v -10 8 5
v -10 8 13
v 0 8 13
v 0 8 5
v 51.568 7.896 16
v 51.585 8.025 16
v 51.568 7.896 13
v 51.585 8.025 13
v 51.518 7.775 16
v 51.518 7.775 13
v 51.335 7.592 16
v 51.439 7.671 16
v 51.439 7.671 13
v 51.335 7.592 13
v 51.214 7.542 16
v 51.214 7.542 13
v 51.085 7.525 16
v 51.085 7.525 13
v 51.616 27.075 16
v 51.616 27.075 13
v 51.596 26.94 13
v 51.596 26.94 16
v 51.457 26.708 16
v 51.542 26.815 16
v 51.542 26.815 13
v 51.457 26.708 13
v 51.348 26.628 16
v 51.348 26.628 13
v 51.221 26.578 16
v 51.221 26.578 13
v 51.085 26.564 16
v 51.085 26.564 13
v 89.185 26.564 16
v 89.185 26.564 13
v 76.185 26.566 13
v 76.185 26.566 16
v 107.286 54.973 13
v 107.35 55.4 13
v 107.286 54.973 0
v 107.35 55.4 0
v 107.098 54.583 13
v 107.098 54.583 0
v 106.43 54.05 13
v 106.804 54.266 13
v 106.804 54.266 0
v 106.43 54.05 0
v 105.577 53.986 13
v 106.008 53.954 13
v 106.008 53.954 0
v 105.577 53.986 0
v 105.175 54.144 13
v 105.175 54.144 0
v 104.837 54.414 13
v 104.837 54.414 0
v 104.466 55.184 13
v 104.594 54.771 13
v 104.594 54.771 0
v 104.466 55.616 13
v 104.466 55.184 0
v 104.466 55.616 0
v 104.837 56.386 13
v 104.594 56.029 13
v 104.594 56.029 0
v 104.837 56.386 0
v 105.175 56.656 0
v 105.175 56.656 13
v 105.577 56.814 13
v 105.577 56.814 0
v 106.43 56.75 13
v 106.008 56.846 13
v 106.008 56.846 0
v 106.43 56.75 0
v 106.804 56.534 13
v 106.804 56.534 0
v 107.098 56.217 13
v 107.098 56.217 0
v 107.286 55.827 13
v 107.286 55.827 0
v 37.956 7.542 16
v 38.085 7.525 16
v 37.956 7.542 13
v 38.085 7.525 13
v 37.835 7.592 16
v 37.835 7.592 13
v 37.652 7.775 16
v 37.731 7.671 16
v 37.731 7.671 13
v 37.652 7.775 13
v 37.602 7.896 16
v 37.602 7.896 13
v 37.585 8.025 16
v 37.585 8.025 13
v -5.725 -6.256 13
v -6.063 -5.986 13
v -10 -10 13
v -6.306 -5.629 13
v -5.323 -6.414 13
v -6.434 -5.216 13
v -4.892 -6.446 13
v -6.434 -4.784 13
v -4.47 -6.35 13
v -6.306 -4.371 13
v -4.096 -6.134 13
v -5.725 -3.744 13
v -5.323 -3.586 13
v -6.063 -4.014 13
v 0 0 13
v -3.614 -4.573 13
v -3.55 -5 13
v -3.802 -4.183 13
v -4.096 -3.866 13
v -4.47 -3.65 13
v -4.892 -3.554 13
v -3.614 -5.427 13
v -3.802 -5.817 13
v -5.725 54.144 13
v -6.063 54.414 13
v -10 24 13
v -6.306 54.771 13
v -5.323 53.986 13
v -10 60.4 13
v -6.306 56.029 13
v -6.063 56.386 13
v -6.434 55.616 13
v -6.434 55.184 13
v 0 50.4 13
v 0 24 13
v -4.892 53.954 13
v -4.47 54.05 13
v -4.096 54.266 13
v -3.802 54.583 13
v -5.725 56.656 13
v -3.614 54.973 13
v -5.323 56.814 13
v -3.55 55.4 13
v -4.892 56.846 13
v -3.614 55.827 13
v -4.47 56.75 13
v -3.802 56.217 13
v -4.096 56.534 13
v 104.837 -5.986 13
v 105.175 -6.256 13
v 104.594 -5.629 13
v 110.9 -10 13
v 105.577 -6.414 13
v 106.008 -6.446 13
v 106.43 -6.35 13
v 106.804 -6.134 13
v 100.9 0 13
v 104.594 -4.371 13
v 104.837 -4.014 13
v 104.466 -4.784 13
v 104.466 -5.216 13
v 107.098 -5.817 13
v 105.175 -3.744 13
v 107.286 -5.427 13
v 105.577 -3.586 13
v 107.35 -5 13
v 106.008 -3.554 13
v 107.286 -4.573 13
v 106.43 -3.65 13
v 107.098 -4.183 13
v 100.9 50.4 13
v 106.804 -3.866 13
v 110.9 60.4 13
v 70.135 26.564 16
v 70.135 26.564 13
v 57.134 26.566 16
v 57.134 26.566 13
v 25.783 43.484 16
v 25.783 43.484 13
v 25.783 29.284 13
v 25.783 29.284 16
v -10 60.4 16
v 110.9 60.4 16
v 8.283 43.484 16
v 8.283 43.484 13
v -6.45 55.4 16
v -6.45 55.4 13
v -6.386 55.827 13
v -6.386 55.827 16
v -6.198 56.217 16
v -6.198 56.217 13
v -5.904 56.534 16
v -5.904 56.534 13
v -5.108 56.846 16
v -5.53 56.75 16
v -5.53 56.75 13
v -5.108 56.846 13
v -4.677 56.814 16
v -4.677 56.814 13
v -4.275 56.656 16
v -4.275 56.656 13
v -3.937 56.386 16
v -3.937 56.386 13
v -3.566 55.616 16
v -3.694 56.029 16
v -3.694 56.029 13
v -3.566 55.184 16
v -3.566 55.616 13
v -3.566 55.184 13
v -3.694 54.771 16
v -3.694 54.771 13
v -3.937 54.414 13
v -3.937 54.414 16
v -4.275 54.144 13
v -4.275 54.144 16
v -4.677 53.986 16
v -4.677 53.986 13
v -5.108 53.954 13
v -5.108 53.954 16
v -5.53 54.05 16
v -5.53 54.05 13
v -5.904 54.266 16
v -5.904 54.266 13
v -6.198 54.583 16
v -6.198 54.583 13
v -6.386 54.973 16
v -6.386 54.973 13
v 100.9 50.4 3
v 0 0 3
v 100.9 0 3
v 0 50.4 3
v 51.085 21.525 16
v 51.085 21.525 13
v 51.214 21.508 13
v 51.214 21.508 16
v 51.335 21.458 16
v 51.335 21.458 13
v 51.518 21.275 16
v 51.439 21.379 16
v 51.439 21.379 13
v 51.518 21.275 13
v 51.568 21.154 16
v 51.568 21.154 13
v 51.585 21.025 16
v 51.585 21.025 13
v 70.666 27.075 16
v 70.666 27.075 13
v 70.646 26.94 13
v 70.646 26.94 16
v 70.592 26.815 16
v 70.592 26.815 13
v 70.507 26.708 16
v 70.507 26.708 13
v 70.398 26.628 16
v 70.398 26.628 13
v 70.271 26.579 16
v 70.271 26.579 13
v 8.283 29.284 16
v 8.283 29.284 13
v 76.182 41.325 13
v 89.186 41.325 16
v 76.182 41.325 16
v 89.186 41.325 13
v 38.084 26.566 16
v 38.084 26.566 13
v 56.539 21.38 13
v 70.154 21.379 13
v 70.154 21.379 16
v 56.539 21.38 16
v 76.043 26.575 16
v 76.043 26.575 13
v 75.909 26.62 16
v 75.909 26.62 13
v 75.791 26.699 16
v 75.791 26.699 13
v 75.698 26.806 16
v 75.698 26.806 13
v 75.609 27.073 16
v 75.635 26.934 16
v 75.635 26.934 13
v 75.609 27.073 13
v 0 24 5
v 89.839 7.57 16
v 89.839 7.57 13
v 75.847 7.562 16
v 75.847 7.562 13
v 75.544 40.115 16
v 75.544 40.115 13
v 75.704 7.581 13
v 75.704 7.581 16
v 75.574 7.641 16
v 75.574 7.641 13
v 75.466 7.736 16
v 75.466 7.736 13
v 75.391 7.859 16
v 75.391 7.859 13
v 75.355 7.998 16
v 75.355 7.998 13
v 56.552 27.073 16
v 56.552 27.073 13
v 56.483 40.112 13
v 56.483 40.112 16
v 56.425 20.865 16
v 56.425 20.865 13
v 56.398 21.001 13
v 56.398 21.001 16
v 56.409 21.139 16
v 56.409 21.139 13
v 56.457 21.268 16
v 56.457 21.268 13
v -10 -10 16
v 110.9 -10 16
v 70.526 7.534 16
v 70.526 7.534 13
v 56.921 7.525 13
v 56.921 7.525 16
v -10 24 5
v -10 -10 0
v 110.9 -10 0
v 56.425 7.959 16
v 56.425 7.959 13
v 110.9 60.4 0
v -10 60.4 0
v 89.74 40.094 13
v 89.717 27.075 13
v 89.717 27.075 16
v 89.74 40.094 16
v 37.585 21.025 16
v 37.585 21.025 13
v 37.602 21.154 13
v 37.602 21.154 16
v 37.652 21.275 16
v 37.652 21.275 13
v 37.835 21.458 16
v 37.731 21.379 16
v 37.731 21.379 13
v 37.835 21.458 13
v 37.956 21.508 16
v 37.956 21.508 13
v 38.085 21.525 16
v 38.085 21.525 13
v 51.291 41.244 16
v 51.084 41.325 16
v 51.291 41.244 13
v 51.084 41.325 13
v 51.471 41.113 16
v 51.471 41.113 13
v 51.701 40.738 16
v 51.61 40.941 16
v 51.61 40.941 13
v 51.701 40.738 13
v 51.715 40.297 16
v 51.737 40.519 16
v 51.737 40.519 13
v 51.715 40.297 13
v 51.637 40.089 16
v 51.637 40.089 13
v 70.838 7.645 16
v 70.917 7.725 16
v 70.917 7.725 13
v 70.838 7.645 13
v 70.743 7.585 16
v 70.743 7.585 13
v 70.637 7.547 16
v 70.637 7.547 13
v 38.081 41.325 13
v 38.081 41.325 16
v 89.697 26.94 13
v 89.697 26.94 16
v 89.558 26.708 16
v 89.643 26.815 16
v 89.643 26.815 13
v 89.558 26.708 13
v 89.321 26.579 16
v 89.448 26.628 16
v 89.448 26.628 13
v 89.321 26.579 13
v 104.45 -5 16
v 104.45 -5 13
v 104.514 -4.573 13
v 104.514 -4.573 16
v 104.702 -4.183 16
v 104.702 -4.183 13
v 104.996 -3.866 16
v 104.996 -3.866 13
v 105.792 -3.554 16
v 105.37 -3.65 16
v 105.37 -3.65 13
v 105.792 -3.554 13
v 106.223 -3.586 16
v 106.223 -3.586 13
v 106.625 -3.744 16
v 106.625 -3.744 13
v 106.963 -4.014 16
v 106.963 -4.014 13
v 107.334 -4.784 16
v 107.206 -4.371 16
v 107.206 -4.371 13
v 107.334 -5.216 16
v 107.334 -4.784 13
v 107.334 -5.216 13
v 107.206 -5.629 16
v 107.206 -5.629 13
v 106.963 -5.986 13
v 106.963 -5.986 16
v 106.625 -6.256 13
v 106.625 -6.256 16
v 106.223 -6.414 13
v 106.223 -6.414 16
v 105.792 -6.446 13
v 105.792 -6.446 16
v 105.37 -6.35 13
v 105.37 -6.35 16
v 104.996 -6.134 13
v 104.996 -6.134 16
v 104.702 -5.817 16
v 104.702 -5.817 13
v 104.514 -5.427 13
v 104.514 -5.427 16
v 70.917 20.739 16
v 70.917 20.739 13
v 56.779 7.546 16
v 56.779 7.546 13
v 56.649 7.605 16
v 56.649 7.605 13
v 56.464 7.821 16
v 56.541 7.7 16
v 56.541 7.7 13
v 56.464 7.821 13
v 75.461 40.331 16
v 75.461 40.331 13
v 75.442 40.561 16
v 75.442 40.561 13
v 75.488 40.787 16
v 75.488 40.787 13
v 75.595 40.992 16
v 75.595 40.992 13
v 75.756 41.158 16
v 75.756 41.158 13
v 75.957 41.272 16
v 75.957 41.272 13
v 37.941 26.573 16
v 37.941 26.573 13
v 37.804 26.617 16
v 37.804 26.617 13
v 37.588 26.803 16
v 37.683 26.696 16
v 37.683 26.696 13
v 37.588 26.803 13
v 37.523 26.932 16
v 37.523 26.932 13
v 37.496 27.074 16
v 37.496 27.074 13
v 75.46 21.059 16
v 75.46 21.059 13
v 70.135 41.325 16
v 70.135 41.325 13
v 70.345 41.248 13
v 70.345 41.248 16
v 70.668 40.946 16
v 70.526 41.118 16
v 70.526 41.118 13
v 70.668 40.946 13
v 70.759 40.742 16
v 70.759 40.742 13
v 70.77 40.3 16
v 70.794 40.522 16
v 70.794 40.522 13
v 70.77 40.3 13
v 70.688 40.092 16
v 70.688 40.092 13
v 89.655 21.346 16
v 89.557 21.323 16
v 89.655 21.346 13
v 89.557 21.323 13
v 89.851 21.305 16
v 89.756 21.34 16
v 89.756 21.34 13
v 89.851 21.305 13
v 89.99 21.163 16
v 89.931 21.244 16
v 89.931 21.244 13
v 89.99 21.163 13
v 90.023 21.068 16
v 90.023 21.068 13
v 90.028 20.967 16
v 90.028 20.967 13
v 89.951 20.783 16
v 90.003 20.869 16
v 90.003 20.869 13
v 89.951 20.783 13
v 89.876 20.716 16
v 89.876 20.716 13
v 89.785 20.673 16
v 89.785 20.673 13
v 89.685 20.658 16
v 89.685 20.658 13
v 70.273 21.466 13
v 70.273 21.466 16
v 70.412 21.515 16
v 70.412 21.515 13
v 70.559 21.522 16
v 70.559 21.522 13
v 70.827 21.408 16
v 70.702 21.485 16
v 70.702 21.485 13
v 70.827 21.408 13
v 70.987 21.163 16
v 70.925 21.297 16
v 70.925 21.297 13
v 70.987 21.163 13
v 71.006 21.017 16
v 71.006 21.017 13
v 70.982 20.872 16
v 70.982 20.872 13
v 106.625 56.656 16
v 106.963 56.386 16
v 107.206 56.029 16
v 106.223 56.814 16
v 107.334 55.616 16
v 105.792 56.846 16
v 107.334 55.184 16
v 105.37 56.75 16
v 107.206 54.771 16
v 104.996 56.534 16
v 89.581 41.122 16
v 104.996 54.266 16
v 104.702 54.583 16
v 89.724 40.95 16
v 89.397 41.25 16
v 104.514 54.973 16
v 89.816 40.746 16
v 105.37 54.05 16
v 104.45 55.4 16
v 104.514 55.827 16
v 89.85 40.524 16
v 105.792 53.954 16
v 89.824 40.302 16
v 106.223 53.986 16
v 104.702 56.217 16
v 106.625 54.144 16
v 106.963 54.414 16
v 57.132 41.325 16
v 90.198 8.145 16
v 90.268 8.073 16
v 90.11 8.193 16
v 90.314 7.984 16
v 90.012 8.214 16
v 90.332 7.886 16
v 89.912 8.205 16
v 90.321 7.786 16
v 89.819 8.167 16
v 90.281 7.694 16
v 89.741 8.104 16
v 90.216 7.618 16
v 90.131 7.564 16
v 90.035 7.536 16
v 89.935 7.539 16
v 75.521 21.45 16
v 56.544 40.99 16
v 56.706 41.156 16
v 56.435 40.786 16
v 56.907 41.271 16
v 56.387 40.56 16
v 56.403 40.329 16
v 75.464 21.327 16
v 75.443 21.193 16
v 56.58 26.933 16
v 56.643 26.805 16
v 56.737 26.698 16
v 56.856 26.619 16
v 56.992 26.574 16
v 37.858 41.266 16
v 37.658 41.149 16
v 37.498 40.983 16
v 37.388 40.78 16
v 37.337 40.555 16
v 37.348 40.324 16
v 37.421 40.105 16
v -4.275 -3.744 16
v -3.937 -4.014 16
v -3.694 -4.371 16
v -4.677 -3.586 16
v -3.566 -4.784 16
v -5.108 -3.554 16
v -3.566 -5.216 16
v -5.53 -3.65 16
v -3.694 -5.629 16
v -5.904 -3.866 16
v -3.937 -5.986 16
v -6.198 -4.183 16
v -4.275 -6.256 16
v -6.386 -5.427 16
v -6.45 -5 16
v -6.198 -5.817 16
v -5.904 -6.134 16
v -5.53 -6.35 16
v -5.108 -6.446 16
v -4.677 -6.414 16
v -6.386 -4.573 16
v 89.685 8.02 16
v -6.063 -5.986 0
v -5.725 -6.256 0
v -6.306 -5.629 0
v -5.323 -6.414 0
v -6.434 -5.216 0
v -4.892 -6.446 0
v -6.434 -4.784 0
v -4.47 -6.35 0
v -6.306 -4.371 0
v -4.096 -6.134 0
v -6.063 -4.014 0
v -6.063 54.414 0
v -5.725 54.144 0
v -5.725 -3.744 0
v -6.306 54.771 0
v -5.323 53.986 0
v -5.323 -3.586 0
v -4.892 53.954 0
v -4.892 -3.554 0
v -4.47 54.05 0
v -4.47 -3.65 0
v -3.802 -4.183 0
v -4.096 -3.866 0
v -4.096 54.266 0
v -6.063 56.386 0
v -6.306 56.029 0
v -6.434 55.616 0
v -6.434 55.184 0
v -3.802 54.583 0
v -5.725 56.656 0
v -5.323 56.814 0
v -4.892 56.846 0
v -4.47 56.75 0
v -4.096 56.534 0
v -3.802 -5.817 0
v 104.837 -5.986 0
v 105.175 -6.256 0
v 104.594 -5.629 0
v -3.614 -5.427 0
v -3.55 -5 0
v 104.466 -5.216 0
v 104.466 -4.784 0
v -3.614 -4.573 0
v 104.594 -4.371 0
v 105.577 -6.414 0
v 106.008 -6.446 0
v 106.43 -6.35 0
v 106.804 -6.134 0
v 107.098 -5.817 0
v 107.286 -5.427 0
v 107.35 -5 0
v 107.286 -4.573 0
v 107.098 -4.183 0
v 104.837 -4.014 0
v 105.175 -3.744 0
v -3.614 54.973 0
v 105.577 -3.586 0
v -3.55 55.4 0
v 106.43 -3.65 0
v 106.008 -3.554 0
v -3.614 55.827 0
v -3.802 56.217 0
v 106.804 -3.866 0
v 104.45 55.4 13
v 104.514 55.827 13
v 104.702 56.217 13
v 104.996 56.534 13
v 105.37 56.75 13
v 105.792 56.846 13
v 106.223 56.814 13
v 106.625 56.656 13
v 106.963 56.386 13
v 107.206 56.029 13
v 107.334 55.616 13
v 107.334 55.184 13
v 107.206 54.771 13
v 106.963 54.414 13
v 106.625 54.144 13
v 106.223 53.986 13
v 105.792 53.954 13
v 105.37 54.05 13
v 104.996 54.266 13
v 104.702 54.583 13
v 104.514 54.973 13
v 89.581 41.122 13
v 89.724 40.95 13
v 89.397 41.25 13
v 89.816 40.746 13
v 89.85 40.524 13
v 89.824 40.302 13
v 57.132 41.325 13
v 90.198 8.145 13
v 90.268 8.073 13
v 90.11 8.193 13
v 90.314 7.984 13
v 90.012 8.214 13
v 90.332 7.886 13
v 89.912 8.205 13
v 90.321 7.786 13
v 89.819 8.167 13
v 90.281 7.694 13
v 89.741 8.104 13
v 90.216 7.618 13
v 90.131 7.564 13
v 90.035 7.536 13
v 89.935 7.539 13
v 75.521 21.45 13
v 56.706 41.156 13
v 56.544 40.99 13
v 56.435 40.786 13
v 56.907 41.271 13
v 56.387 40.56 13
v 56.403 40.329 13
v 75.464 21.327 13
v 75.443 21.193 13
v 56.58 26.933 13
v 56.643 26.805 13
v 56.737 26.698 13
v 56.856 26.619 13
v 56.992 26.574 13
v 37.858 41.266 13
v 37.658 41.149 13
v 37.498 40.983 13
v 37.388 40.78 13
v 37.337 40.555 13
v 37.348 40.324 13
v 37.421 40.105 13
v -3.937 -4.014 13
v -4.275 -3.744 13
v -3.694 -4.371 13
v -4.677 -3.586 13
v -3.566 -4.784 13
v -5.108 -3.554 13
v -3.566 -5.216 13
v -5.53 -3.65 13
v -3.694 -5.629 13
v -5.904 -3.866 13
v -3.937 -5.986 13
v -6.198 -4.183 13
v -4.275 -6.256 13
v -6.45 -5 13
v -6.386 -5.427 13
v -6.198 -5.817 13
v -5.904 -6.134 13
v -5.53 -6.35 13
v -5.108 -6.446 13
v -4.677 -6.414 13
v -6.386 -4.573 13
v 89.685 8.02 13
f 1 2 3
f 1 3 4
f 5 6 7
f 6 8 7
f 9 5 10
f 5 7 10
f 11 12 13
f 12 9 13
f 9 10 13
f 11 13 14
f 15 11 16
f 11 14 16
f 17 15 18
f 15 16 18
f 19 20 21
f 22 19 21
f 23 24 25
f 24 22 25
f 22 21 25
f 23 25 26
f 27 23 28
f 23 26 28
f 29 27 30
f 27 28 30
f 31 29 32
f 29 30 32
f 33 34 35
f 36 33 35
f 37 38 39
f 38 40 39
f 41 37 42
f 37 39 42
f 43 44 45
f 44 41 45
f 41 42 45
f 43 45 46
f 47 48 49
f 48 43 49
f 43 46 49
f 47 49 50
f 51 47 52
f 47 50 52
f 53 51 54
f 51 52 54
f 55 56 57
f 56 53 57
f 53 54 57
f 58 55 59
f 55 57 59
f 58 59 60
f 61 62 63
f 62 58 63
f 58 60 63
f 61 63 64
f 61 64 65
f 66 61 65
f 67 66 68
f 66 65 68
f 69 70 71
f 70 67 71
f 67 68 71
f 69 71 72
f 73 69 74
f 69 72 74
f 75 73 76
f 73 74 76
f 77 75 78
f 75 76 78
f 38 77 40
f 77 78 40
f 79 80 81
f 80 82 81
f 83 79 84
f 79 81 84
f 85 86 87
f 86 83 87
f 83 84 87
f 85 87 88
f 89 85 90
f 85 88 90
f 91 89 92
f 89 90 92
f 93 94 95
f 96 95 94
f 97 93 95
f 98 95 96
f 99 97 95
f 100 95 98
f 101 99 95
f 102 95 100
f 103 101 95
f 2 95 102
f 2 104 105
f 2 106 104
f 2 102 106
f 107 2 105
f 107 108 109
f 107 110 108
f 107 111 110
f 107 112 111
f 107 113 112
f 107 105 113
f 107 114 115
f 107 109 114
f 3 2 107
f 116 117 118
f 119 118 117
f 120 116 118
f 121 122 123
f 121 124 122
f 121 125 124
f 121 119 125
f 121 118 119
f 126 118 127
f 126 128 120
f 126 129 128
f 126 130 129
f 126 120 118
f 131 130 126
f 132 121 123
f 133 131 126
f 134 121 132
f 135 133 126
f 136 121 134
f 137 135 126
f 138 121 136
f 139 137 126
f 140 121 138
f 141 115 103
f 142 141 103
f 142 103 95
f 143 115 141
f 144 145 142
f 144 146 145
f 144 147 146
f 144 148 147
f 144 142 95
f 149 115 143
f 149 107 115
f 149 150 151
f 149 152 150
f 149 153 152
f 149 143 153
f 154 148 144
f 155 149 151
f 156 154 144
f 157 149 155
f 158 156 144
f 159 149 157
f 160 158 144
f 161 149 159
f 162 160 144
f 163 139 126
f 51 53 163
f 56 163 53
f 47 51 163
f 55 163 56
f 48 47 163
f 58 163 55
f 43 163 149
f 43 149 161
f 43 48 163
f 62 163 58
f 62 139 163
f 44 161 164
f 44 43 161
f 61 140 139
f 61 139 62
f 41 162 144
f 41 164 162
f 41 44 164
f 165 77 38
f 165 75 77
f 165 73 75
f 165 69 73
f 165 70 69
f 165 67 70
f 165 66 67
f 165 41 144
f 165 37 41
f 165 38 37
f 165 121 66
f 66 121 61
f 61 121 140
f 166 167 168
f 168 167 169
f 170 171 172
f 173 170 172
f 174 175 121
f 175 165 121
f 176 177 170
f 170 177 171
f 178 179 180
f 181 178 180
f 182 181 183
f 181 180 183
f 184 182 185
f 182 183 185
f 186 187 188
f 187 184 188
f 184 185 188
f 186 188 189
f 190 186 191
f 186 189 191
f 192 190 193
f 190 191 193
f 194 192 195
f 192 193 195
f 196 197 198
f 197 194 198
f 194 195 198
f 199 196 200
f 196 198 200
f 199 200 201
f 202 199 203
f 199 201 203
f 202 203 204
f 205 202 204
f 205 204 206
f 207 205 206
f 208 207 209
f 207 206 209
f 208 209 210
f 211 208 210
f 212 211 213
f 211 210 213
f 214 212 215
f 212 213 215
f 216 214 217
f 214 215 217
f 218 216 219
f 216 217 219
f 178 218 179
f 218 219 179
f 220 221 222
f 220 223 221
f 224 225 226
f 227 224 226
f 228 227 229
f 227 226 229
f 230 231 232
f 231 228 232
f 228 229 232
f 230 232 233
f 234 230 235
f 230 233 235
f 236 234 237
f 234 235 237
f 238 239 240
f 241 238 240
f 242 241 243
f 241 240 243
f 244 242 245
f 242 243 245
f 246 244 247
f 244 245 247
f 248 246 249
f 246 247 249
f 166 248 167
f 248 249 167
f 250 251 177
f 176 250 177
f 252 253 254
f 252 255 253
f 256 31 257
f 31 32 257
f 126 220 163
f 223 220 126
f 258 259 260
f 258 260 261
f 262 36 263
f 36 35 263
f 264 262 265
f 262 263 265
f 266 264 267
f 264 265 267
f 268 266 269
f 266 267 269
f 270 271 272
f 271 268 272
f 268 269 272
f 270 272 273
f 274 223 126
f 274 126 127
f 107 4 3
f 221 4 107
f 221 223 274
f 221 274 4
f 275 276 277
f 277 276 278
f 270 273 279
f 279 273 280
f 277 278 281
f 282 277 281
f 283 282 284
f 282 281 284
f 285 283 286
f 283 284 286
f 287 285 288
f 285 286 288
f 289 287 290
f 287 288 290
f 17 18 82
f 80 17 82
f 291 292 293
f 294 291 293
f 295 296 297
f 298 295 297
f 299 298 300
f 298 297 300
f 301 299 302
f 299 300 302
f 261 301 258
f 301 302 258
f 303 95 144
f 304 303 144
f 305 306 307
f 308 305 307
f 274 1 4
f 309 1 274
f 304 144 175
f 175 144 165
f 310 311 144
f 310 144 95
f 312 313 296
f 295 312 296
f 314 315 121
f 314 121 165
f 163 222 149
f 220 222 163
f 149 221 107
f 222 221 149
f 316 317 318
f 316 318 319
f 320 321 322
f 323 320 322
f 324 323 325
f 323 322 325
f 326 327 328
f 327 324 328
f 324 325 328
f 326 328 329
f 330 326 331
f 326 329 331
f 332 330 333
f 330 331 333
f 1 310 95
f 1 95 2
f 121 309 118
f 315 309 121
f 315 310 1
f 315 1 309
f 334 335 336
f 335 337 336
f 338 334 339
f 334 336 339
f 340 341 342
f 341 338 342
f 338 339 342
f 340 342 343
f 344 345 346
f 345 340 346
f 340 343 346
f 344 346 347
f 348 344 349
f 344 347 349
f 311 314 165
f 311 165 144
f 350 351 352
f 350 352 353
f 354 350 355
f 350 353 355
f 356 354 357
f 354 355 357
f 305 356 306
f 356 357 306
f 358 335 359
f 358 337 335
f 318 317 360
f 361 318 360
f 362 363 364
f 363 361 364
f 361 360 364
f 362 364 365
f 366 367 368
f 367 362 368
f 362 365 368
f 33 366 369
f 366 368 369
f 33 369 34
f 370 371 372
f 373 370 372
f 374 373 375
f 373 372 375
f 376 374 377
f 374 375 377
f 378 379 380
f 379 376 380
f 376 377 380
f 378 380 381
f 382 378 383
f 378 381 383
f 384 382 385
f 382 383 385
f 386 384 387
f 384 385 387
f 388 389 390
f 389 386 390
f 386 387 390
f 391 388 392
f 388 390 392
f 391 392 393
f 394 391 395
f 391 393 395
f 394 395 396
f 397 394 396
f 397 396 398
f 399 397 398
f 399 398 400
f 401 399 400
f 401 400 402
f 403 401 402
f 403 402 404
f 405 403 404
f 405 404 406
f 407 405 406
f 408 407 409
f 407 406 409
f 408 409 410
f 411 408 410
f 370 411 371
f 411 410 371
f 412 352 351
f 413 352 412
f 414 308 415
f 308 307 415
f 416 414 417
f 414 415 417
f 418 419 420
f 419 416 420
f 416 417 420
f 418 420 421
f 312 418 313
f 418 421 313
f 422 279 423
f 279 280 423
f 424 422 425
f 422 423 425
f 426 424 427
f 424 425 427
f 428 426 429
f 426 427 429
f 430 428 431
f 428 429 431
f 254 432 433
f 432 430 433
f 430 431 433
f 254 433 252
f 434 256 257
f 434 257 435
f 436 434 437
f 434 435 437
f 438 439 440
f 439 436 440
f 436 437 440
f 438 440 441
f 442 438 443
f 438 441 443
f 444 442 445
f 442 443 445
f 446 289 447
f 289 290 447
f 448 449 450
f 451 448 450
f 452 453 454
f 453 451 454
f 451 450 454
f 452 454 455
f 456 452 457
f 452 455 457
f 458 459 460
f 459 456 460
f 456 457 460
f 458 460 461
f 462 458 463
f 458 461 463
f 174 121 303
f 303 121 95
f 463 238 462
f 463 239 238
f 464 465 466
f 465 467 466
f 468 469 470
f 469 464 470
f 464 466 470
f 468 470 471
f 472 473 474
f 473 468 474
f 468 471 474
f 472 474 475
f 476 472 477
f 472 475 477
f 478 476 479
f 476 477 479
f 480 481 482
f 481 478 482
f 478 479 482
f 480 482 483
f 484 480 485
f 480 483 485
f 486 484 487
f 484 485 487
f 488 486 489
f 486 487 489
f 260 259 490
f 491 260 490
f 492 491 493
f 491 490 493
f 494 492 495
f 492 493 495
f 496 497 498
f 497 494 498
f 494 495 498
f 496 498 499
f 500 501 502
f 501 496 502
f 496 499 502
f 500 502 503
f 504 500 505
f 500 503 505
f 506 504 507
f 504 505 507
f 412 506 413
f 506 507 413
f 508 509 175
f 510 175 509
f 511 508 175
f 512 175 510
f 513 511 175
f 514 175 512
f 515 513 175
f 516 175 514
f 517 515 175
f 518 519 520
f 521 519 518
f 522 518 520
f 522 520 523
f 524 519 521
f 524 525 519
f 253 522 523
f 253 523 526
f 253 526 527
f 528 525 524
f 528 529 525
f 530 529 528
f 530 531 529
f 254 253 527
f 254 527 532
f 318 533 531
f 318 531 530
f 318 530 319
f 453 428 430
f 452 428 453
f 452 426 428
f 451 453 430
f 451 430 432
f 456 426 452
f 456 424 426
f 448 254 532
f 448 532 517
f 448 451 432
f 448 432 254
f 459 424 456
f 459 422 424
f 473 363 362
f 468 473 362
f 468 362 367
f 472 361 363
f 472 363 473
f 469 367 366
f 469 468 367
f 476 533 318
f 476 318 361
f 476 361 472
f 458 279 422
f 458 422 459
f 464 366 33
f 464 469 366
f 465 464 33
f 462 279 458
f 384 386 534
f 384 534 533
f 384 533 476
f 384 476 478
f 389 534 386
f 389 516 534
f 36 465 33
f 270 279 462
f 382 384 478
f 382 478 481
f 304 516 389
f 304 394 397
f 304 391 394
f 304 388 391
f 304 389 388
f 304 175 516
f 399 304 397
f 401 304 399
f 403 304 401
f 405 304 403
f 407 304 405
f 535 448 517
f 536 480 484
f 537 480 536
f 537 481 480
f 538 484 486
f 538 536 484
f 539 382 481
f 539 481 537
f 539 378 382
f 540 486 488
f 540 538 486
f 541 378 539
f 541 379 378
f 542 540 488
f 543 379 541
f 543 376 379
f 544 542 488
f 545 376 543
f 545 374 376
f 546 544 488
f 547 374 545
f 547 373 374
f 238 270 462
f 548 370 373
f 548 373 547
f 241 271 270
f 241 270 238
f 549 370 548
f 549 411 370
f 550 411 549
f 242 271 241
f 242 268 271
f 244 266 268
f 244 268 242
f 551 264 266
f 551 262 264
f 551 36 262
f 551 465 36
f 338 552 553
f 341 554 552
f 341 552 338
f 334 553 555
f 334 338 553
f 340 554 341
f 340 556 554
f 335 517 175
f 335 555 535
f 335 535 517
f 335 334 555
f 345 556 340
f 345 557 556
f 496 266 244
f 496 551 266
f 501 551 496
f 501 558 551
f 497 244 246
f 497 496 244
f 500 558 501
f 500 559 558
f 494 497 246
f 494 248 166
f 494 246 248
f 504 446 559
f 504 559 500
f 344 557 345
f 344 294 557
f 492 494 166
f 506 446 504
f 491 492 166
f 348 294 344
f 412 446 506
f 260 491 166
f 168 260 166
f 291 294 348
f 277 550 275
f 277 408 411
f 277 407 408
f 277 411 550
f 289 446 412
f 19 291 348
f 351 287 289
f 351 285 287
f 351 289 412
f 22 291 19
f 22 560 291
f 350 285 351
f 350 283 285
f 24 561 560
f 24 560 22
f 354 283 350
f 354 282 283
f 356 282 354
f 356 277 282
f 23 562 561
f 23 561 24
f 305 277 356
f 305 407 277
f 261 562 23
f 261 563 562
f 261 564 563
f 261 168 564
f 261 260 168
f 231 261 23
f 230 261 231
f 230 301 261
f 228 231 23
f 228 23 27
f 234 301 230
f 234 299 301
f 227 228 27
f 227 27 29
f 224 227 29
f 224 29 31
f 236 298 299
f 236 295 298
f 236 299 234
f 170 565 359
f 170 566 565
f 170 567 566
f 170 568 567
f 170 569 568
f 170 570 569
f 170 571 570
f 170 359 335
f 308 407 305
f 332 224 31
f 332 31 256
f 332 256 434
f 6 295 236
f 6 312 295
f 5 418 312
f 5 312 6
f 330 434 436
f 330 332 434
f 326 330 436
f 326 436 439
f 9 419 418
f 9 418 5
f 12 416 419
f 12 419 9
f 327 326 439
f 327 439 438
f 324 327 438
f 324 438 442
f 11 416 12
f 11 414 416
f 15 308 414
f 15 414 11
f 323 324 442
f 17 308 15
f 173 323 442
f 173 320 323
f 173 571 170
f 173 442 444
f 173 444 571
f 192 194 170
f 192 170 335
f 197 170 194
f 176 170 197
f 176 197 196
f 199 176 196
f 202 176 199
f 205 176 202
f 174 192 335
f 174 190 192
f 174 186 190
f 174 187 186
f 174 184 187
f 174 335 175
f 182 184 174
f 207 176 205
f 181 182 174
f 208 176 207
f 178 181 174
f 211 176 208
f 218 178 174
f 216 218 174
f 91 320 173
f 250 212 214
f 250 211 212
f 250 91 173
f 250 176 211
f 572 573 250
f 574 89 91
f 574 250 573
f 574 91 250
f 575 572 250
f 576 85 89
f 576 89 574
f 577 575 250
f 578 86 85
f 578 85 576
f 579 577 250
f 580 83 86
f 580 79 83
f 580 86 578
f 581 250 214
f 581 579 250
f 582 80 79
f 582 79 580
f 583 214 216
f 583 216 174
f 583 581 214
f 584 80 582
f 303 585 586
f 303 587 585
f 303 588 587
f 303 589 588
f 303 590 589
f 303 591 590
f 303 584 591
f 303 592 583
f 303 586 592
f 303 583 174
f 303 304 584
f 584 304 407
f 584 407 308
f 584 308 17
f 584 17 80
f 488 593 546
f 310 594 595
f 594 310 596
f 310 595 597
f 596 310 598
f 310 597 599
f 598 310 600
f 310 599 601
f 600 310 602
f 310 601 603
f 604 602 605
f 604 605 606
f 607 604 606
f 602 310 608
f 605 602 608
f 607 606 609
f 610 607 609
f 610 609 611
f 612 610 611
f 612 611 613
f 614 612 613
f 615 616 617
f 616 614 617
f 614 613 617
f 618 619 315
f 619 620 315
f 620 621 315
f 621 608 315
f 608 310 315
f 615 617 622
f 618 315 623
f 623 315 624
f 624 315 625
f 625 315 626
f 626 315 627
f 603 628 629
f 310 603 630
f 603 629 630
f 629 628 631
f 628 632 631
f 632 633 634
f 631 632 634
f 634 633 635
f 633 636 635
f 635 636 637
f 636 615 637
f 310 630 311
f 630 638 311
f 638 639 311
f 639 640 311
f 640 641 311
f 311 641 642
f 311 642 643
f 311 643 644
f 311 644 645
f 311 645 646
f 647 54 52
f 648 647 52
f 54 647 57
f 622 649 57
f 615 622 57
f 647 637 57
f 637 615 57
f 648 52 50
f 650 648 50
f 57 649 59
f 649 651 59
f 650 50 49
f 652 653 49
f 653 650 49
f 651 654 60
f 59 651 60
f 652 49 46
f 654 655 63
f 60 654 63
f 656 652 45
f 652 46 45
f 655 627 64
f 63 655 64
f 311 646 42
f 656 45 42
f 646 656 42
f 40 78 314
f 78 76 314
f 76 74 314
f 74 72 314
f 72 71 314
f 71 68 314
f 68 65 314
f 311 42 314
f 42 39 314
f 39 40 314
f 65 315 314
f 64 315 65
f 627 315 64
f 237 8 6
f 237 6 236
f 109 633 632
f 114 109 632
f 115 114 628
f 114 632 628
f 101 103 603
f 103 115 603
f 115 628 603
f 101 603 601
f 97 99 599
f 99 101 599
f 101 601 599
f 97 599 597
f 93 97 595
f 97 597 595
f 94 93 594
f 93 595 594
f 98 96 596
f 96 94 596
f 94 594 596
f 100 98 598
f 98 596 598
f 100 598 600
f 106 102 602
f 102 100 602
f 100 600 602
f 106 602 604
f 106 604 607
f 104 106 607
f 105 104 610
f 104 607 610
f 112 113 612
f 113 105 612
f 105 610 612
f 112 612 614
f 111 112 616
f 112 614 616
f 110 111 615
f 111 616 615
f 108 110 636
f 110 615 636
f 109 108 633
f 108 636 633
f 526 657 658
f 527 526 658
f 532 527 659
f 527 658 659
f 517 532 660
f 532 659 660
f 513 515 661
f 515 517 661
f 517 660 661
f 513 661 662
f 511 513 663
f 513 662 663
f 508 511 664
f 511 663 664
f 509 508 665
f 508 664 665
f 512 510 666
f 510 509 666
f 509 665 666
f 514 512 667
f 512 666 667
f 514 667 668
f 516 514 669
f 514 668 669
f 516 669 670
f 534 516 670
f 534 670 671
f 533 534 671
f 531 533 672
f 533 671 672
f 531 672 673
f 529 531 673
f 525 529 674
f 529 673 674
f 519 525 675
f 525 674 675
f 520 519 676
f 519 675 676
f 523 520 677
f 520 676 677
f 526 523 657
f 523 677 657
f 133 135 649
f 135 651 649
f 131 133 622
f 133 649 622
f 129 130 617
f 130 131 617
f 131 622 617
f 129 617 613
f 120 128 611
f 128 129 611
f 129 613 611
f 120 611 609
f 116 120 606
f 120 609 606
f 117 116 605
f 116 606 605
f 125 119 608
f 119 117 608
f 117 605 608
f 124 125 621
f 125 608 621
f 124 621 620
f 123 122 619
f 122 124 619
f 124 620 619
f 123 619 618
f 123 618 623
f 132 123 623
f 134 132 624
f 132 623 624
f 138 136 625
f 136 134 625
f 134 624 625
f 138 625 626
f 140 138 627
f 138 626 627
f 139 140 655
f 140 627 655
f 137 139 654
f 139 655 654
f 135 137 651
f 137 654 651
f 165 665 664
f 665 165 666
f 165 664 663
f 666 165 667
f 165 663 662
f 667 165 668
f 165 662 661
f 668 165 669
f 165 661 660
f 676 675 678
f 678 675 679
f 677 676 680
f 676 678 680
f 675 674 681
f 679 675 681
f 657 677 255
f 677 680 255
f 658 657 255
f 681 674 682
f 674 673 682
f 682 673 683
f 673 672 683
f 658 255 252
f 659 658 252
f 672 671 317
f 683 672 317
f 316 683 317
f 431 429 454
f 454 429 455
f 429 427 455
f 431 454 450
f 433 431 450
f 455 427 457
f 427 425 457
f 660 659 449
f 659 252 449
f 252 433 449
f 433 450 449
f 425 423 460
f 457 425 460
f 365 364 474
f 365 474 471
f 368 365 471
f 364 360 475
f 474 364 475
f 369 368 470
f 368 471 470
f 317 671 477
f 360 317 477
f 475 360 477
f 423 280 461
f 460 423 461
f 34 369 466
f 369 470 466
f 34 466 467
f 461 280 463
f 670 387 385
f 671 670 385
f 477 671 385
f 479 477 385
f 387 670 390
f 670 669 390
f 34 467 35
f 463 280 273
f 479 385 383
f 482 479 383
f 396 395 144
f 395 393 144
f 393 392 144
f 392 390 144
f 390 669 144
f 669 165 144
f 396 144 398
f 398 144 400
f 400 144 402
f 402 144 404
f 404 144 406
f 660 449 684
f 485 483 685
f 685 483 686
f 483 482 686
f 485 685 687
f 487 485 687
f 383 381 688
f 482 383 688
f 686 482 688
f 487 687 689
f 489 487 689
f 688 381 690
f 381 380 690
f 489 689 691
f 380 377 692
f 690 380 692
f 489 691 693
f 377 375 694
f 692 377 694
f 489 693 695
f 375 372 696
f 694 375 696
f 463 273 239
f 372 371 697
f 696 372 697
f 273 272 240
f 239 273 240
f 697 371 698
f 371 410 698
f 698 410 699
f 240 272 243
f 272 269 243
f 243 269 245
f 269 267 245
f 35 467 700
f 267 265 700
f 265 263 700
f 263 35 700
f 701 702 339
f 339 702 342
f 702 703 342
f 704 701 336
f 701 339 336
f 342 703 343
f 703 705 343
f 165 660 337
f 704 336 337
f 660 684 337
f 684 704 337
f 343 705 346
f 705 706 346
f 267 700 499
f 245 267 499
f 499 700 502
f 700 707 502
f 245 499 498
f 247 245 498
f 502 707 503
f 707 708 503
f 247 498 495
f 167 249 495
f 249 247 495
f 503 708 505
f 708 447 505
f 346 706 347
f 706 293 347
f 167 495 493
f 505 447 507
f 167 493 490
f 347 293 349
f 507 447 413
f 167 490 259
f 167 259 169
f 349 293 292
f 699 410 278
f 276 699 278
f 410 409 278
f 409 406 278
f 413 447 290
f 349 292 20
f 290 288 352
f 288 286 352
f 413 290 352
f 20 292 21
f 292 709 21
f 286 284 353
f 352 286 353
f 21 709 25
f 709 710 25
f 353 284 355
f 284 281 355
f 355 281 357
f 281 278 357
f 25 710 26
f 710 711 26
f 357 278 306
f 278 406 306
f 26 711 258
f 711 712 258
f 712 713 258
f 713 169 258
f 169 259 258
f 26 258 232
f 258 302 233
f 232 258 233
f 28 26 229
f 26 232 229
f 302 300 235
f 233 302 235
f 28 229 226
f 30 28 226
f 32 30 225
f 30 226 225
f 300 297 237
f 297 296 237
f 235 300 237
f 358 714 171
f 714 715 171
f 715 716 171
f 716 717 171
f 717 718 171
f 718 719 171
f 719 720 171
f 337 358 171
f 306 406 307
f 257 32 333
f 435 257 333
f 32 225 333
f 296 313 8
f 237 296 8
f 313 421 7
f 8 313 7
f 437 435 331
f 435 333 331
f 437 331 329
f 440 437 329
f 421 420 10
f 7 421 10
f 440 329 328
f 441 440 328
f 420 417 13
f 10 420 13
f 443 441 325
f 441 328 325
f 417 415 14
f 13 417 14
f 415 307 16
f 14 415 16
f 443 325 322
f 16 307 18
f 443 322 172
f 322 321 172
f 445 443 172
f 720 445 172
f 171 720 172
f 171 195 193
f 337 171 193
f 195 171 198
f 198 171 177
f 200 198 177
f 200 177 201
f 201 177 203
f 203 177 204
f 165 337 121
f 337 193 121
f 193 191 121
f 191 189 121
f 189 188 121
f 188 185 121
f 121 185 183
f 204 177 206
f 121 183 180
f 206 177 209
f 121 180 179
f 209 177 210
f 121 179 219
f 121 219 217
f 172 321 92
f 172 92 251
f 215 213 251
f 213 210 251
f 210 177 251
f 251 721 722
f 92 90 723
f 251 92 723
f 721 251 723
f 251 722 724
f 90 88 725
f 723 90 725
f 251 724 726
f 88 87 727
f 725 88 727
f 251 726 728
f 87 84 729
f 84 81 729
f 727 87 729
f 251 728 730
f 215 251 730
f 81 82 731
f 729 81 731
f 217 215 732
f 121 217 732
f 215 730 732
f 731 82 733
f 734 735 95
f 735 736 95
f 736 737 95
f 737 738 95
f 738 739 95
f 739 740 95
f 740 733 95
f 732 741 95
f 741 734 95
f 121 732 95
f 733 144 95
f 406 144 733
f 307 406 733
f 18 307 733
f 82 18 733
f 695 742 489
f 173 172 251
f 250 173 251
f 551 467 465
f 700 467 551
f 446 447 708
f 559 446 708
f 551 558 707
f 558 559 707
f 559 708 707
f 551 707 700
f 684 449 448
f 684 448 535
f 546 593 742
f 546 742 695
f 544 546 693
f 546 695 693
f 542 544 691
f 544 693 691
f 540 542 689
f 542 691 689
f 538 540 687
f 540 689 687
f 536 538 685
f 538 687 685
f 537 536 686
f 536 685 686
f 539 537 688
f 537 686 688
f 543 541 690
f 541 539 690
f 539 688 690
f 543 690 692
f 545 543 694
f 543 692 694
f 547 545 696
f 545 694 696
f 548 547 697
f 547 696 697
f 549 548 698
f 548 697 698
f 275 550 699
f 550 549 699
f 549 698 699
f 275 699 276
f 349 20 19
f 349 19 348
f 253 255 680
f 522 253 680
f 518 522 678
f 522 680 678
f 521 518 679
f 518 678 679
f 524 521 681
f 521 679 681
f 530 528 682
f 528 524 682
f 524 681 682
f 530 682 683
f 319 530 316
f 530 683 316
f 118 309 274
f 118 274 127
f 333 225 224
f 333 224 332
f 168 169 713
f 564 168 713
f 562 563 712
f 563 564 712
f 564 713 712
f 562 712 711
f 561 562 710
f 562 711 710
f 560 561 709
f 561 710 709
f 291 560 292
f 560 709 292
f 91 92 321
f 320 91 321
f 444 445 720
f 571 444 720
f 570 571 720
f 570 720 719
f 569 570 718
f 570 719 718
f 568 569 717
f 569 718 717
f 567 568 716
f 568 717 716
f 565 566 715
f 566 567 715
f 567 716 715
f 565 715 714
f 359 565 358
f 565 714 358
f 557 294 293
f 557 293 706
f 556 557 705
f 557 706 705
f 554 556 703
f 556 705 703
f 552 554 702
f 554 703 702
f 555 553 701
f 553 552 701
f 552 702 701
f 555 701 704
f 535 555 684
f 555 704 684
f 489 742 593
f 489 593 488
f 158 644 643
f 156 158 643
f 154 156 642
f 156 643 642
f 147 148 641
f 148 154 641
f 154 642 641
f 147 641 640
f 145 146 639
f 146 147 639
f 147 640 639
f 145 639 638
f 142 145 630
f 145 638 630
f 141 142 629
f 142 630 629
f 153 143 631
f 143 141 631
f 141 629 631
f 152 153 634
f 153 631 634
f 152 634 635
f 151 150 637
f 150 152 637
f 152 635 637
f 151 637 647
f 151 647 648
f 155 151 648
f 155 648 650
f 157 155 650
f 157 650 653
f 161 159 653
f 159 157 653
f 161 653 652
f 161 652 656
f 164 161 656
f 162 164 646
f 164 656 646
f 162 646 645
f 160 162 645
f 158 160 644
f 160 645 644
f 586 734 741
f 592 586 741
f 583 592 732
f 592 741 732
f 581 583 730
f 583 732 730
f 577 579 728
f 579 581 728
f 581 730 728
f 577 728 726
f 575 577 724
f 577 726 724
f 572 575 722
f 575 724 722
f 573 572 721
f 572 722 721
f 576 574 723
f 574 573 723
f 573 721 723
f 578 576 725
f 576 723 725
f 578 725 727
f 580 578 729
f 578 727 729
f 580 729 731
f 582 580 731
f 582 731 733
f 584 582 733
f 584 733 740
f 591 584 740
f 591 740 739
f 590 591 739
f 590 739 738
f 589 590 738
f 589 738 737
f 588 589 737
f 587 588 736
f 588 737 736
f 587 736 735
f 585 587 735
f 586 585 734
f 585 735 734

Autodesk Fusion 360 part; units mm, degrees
sketch "Sketch1" plane through (0, 0, 0) normal (0, 0, 1) x (1, 0, 0)
  line L0 (0, 0) -> (100.9, 0)
  line L1 (100.9, 0) -> (100.9, 50.4)
  line L2 (100.9, 50.4) -> (0, 50.4)
  line L3 (0, 50.4) -> (0, 0)
  line L4 (-10, 60.4) -> (110.9, 60.4)
  line L5 (110.9, 60.4) -> (110.9, -10)
  line L6 (110.9, -10) -> (-10, -10)
  line L7 (-10, -10) -> (-10, 60.4)
  circle A0 centre (-5, 55.4) radius 1.45
  circle A1 centre (-5, -5) radius 1.45
  circle A2 centre (105.9, 55.4) radius 1.45
  circle A3 centre (105.9, -5) radius 1.45
  dimension "d1" = 100.9
  dimension "d2" = 50.4
  dimension "d3" = 10
  dimension "d4" = 10
  dimension "d5" = 10
  dimension "d6" = 10
  dimension "d7" = 2.9
  dimension "d8" = 2.9
  dimension "d9" = 2.9
  dimension "d10" = 2.9
  dimension "d11" = 5
  dimension "d12" = 5
  dimension "d13" = 5
  dimension "d14" = 5
  dimension "d15" = 5
  dimension "d16" = 5
  dimension "d17" = 5
  dimension "d18" = 5
extrude "Extrude1" add sketch "Sketch1" along normal blind 13 makes body 1
extrude "Extrude2" add sketch "Sketch1" along normal blind 3 contours L0 L1 L2 L3 bodies 1
sketch "plate-2026-06-09T01_52_59.866Z" plane through (0, 0, 13) normal (0, 0, 1) x (1, 0, 0)
  line L0 (3.025, -32.525) -> (16.025, -32.525)
  line L1 (3.025, -46.525) -> (16.025, -46.525)
  line L2 (2.525, -33.025) -> (2.525, -46.025)
  line L3 (16.525, -33.025) -> (16.525, -46.025)
  arc A0 (3.025, -32.525) -> (2.525, -33.025) centre (3.025, -33.025) ccw
  arc A1 (16.525, -33.025) -> (16.025, -32.525) centre (16.025, -33.025) ccw
  arc A2 (2.525, -46.025) -> (3.025, -46.525) centre (3.025, -46.025) ccw
  arc A3 (16.025, -46.525) -> (16.525, -46.025) centre (16.025, -46.025) ccw
  line L4 (22.075, -32.525) -> (35.075, -32.525)
  line L5 (22.075, -46.525) -> (35.075, -46.525)
  line L6 (21.575, -33.025) -> (21.575, -46.025)
  line L7 (35.575, -33.025) -> (35.575, -46.025)
  arc A4 (22.075, -32.525) -> (21.575, -33.025) centre (22.075, -33.025) ccw
  arc A5 (35.575, -33.025) -> (35.075, -32.525) centre (35.075, -33.025) ccw
  arc A6 (21.575, -46.025) -> (22.075, -46.525) centre (22.075, -46.025) ccw
  arc A7 (35.075, -46.525) -> (35.575, -46.025) centre (35.075, -46.025) ccw
  line L8 (41.125, -32.525) -> (54.125, -32.525)
  line L9 (41.125, -46.525) -> (54.125, -46.525)
  line L10 (40.625, -33.025) -> (40.625, -46.025)
  line L11 (54.625, -33.025) -> (54.625, -46.025)
  arc A8 (41.125, -32.525) -> (40.625, -33.025) centre (41.125, -33.025) ccw
  arc A9 (54.625, -33.025) -> (54.125, -32.525) centre (54.125, -33.025) ccw
  arc A10 (40.625, -46.025) -> (41.125, -46.525) centre (41.125, -46.025) ccw
  arc A11 (54.125, -46.525) -> (54.625, -46.025) centre (54.125, -46.025) ccw
  line L12 (0, -49.05) -> (57.15, -49.05)
  line L13 (0, -30) -> (57.15, -30)
  line L14 (0, -49.05) -> (0, -30)
  line L15 (57.15, -49.05) -> (57.15, -30)
sketch "Sketch3" plane through (0, 0, 13) normal (0, 0, 1) x (-1, 0, 0)
  circle A0 centre (5, 5) radius 1.45
  circle A1 centre (-105.9, -55.4) radius 1.45
  line L0 (0, 0) -> (0, -50.4)
  line L1 (0, -50.4) -> (-100.9, -50.4)
  line L2 (-100.9, -50.4) -> (-100.9, 0)
  line L3 (-100.9, 0) -> (0, 0)
  circle A2 centre (-105.9, 5) radius 1.45
  circle A3 centre (5, -55.4) radius 1.45
  line L4 (10, 10) -> (-110.9, 10)
  line L5 (-110.9, 10) -> (-110.9, -60.4)
  line L6 (-110.9, -60.4) -> (10, -60.4)
  line L7 (10, -60.4) -> (10, 10)
  line L8 (10, -60.4) -> (-110.9, -60.4)
  line L9 (-110.9, -60.4) -> (-110.9, 10)
  line L10 (-110.9, 10) -> (10, 10)
  line L11 (10, 10) -> (10, -60.4)
  line L12 (-100.9, 0) -> (-100.9, -50.4)
  line L13 (-89.8393, -7.57) -> (-75.8466, -7.5619)
  line L14 (-89.5574, -21.3229) -> (-75.5212, -21.4498)
  line L15 (-89.685, -8.0205) -> (-89.685, -20.6581)
  line L16 (-75.3552, -7.9982) -> (-75.4596, -21.059)
  arc A4 (-89.8393, -7.57) -> (-89.685, -8.0205) centre (-89.9922, -7.874) ccw
  arc A5 (-75.3552, -7.9982) -> (-75.8466, -7.5619) centre (-75.8396, -8.0489) ccw
  arc A6 (-89.685, -20.6581) -> (-89.5574, -21.3229) centre (-89.685, -21.0027) ccw
  arc A7 (-75.5212, -21.4498) -> (-75.4596, -21.059) centre (-75.9243, -21.186) ccw
  line L17 (-70.5258, -7.5339) -> (-56.9206, -7.525)
  line L18 (-70.1538, -21.379) -> (-56.5388, -21.3796)
  line L19 (-70.9171, -7.7251) -> (-70.9171, -20.7393)
  line L20 (-56.425, -7.9587) -> (-56.425, -20.8651)
  arc A8 (-70.5258, -7.5339) -> (-70.9171, -7.7251) centre (-70.5239, -8.0339) ccw
  arc A9 (-56.425, -7.9587) -> (-56.9206, -7.525) centre (-56.9206, -8.025) ccw
  arc A10 (-70.9171, -20.7393) -> (-70.1538, -21.379) centre (-70.5063, -21.0243) ccw
  arc A11 (-56.5388, -21.3796) -> (-56.425, -20.8651) centre (-56.8968, -21.0306) ccw
  line L21 (-51.085, -7.525) -> (-38.085, -7.525)
  line L22 (-51.085, -21.525) -> (-38.085, -21.525)
  line L23 (-51.585, -8.025) -> (-51.585, -21.025)
  line L24 (-37.585, -8.025) -> (-37.585, -21.025)
  arc A12 (-51.085, -7.525) -> (-51.585, -8.025) centre (-51.085, -8.025) ccw
  arc A13 (-37.585, -8.025) -> (-38.085, -7.525) centre (-38.085, -8.025) ccw
  arc A14 (-51.585, -21.025) -> (-51.085, -21.525) centre (-51.085, -21.025) ccw
  arc A15 (-38.085, -21.525) -> (-37.585, -21.025) centre (-38.085, -21.025) ccw
  line L25 (-89.185, -26.5643) -> (-76.1846, -26.5656)
  line L26 (-89.1857, -41.325) -> (-76.1819, -41.325)
  line L27 (-89.7171, -27.0749) -> (-89.7399, -40.094)
  line L28 (-75.6087, -27.0733) -> (-75.5441, -40.1153)
  arc A16 (-89.185, -26.5643) -> (-89.7171, -27.0749) centre (-89.1992, -27.0821) ccw
  arc A17 (-75.6087, -27.0733) -> (-76.1846, -26.5656) centre (-76.1481, -27.1046) ccw
  arc A18 (-89.7399, -40.094) -> (-89.1857, -41.325) centre (-89.0163, -40.5084) ccw
  arc A19 (-76.1819, -41.325) -> (-75.5441, -40.1153) centre (-76.2549, -40.5135) ccw
  line L29 (-70.135, -26.5643) -> (-57.1345, -26.5658)
  line L30 (-70.1351, -41.325) -> (-57.1315, -41.325)
  line L31 (-70.666, -27.0749) -> (-70.6881, -40.0921)
  line L32 (-56.5525, -27.0733) -> (-56.4829, -40.1119)
  arc A20 (-70.135, -26.5643) -> (-70.666, -27.0749) centre (-70.149, -27.0811) ccw
  arc A21 (-56.5525, -27.0733) -> (-57.1345, -26.5658) centre (-57.0939, -27.1067) ccw
  arc A22 (-70.6881, -40.0921) -> (-70.1351, -41.325) centre (-69.9509, -40.5019) ccw
  arc A23 (-57.1315, -41.325) -> (-56.4829, -40.1119) centre (-57.2114, -40.5024) ccw
  line L33 (-51.085, -26.5642) -> (-38.0845, -26.566)
  line L34 (-51.0841, -41.325) -> (-38.081, -41.325)
  line L35 (-51.6155, -27.0749) -> (-51.6373, -40.0893)
  line L36 (-37.4955, -27.0735) -> (-37.4207, -40.1046)
  arc A24 (-51.085, -26.5642) -> (-51.6155, -27.0749) centre (-51.0994, -27.0802) ccw
  arc A25 (-37.4955, -27.0735) -> (-38.0845, -26.566) centre (-38.0381, -27.1077) ccw
  arc A26 (-51.6373, -40.0893) -> (-51.0841, -41.325) centre (-50.8785, -40.4913) ccw
  arc A27 (-38.081, -41.325) -> (-37.4207, -40.1046) centre (-38.1843, -40.4803) ccw
  line L37 (-92.21, -43.85) -> (-35.06, -43.85)
  line L38 (-92.21, -5) -> (-35.06, -5)
  line L39 (-92.21, -43.85) -> (-92.21, -5)
  line L40 (-35.06, -43.85) -> (-35.06, -5)
  line L41 (10, -60.4) -> (-110.9, -60.4)
  line L42 (-110.9, -60.4) -> (-110.9, 10)
  line L43 (-110.9, 10) -> (10, 10)
  line L44 (10, 10) -> (10, -60.4)
  line L45 (-8.2831, -43.484) -> (-25.7831, -43.484)
  line L46 (-25.7831, -43.484) -> (-25.7831, -29.284)
  line L47 (-25.7831, -29.284) -> (-8.2831, -29.284)
  line L48 (-8.2831, -29.284) -> (-8.2831, -43.484)
  dimension "d24" = 6.55
  dimension "d25" = 2.525
  dimension "d26" = 2.525
  dimension "d27" = 2.525
  dimension "d28" = 2.525
  dimension "d29" = 13.0038
  dimension "d30" = 8.69
  dimension "d31" = 2.525
  dimension "d32" = 17.5
  dimension "d33" = 14.2
  dimension "d34" = 9.2769
extrude "Extrude3" add sketch "Sketch3" along normal blind 3 separate body contours L0 L1 L2 L3 L12 | L4 L5 L6 L7 L8 L9 L10 L11 L41 L42 L43 L44 | L37 L38 L39 L40 makes body 2
sketch "Sketch4" plane through (0, 0, 0) normal (1, 0, 0) x (0, 1, 0)
  line L0 (40, 10) -> (56, 10)
  line L1 (56, 10) -> (56, 2)
  line L2 (56, 2) -> (40, 2)
  line L3 (40, 2) -> (40, 10)
  dimension "d37" = 16
  dimension "d38" = 8
sketch "Sketch5" plane through (-10, 0, 0) normal (-1, 0, 0) x (0, -1, 0)
  line L0 (-60.4, 13) -> (10, 13)
  line L1 (10, 13) -> (10, 16)
  line L2 (10, 16) -> (-60.4, 16)
  line L3 (-60.4, 16) -> (-60.4, 13)
  line L4 (-24, 13) -> (-8, 13)
  line L5 (-8, 13) -> (-8, 5)
  line L6 (-8, 5) -> (-24, 5)
  line L7 (-24, 5) -> (-24, 13)
  dimension "d39" = 16
extrude "Extrude4" cut sketch "Sketch5" against normal blind 10 contours L0 L4 L5 L6 L7 bodies 1
